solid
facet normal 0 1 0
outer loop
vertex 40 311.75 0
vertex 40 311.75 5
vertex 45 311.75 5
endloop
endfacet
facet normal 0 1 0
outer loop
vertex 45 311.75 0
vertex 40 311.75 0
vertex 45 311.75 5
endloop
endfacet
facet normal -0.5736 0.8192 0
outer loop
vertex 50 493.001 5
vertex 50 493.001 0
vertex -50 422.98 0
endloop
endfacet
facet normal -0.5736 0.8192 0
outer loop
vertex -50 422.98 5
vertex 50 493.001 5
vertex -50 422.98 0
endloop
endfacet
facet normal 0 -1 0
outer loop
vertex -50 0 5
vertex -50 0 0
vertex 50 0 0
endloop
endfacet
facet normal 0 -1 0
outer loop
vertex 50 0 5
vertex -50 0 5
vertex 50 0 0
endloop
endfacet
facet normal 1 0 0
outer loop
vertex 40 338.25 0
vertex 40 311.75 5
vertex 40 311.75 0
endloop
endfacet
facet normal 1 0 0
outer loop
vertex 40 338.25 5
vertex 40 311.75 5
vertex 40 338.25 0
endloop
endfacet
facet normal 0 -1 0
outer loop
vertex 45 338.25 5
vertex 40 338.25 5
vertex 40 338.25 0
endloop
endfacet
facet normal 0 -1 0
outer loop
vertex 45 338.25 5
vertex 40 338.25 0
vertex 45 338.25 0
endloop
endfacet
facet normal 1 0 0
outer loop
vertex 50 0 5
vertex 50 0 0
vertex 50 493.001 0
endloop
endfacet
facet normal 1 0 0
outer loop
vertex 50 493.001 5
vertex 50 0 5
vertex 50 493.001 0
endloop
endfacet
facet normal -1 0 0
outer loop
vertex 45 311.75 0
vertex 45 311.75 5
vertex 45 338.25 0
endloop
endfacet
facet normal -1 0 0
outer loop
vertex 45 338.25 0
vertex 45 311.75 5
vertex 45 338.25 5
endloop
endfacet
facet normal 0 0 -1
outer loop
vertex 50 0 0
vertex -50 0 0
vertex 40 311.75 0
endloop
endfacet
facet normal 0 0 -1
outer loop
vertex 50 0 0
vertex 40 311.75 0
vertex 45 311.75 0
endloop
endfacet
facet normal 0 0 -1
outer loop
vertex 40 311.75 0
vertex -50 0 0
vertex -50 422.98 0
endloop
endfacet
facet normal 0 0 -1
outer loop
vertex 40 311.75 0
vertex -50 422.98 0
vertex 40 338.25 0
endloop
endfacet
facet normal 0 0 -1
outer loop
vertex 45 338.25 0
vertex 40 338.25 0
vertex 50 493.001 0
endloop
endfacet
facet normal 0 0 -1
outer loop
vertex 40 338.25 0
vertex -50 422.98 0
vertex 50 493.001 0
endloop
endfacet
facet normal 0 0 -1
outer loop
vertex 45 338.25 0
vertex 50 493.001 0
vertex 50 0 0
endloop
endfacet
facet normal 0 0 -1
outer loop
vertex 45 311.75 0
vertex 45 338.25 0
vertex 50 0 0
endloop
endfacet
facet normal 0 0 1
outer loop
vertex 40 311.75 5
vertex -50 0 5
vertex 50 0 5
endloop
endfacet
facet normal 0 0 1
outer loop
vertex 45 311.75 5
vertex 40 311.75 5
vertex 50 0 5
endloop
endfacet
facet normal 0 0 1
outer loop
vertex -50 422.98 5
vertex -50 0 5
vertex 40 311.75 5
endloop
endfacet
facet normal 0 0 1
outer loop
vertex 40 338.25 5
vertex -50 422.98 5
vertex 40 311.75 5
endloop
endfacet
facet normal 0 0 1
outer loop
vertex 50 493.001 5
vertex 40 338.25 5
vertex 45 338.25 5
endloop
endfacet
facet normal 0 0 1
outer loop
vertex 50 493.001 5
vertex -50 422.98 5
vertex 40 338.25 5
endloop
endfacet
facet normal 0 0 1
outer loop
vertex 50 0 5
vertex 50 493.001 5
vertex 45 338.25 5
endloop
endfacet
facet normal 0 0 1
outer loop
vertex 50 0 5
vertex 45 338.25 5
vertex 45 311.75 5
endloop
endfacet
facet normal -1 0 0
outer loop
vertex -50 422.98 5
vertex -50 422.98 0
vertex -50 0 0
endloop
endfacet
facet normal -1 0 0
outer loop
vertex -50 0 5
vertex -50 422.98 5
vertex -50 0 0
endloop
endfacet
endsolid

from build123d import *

# Parameters (mm, degrees)
BOSS_EXTRUDE1_DEPTH = 5
CUT_EXTRUDE1_REACH  = 7
SKETCH3_W           = 5
SKETCH3_H           = 26.5


with BuildPart() as part:
    # Sketch2 → Boss-Extrude1 (new body)
    with BuildSketch(Plane.XY):
        Polygon((-50, 422.98), (-50, 0), (50, 0), (50, 422.98), (50, 493.000753821), align=None)
    extrude(amount=BOSS_EXTRUDE1_DEPTH)

    # Sketch3 → Cut-Extrude1 (cut, up to next)
    with BuildSketch(Plane.XY.offset(5), mode=Mode.PRIVATE) as cut_extrude1_sk1:
        with Locations((42.5, 325)):
            Rectangle(SKETCH3_W, SKETCH3_H)
    cut_extrude1_tool1 = extrude(cut_extrude1_sk1.sketch, amount=-CUT_EXTRUDE1_REACH, mode=Mode.PRIVATE) & part.part
    add(cut_extrude1_tool1.solids().sort_by_distance((42.5, 325, 5))[0], mode=Mode.SUBTRACT)


solid = part.part
